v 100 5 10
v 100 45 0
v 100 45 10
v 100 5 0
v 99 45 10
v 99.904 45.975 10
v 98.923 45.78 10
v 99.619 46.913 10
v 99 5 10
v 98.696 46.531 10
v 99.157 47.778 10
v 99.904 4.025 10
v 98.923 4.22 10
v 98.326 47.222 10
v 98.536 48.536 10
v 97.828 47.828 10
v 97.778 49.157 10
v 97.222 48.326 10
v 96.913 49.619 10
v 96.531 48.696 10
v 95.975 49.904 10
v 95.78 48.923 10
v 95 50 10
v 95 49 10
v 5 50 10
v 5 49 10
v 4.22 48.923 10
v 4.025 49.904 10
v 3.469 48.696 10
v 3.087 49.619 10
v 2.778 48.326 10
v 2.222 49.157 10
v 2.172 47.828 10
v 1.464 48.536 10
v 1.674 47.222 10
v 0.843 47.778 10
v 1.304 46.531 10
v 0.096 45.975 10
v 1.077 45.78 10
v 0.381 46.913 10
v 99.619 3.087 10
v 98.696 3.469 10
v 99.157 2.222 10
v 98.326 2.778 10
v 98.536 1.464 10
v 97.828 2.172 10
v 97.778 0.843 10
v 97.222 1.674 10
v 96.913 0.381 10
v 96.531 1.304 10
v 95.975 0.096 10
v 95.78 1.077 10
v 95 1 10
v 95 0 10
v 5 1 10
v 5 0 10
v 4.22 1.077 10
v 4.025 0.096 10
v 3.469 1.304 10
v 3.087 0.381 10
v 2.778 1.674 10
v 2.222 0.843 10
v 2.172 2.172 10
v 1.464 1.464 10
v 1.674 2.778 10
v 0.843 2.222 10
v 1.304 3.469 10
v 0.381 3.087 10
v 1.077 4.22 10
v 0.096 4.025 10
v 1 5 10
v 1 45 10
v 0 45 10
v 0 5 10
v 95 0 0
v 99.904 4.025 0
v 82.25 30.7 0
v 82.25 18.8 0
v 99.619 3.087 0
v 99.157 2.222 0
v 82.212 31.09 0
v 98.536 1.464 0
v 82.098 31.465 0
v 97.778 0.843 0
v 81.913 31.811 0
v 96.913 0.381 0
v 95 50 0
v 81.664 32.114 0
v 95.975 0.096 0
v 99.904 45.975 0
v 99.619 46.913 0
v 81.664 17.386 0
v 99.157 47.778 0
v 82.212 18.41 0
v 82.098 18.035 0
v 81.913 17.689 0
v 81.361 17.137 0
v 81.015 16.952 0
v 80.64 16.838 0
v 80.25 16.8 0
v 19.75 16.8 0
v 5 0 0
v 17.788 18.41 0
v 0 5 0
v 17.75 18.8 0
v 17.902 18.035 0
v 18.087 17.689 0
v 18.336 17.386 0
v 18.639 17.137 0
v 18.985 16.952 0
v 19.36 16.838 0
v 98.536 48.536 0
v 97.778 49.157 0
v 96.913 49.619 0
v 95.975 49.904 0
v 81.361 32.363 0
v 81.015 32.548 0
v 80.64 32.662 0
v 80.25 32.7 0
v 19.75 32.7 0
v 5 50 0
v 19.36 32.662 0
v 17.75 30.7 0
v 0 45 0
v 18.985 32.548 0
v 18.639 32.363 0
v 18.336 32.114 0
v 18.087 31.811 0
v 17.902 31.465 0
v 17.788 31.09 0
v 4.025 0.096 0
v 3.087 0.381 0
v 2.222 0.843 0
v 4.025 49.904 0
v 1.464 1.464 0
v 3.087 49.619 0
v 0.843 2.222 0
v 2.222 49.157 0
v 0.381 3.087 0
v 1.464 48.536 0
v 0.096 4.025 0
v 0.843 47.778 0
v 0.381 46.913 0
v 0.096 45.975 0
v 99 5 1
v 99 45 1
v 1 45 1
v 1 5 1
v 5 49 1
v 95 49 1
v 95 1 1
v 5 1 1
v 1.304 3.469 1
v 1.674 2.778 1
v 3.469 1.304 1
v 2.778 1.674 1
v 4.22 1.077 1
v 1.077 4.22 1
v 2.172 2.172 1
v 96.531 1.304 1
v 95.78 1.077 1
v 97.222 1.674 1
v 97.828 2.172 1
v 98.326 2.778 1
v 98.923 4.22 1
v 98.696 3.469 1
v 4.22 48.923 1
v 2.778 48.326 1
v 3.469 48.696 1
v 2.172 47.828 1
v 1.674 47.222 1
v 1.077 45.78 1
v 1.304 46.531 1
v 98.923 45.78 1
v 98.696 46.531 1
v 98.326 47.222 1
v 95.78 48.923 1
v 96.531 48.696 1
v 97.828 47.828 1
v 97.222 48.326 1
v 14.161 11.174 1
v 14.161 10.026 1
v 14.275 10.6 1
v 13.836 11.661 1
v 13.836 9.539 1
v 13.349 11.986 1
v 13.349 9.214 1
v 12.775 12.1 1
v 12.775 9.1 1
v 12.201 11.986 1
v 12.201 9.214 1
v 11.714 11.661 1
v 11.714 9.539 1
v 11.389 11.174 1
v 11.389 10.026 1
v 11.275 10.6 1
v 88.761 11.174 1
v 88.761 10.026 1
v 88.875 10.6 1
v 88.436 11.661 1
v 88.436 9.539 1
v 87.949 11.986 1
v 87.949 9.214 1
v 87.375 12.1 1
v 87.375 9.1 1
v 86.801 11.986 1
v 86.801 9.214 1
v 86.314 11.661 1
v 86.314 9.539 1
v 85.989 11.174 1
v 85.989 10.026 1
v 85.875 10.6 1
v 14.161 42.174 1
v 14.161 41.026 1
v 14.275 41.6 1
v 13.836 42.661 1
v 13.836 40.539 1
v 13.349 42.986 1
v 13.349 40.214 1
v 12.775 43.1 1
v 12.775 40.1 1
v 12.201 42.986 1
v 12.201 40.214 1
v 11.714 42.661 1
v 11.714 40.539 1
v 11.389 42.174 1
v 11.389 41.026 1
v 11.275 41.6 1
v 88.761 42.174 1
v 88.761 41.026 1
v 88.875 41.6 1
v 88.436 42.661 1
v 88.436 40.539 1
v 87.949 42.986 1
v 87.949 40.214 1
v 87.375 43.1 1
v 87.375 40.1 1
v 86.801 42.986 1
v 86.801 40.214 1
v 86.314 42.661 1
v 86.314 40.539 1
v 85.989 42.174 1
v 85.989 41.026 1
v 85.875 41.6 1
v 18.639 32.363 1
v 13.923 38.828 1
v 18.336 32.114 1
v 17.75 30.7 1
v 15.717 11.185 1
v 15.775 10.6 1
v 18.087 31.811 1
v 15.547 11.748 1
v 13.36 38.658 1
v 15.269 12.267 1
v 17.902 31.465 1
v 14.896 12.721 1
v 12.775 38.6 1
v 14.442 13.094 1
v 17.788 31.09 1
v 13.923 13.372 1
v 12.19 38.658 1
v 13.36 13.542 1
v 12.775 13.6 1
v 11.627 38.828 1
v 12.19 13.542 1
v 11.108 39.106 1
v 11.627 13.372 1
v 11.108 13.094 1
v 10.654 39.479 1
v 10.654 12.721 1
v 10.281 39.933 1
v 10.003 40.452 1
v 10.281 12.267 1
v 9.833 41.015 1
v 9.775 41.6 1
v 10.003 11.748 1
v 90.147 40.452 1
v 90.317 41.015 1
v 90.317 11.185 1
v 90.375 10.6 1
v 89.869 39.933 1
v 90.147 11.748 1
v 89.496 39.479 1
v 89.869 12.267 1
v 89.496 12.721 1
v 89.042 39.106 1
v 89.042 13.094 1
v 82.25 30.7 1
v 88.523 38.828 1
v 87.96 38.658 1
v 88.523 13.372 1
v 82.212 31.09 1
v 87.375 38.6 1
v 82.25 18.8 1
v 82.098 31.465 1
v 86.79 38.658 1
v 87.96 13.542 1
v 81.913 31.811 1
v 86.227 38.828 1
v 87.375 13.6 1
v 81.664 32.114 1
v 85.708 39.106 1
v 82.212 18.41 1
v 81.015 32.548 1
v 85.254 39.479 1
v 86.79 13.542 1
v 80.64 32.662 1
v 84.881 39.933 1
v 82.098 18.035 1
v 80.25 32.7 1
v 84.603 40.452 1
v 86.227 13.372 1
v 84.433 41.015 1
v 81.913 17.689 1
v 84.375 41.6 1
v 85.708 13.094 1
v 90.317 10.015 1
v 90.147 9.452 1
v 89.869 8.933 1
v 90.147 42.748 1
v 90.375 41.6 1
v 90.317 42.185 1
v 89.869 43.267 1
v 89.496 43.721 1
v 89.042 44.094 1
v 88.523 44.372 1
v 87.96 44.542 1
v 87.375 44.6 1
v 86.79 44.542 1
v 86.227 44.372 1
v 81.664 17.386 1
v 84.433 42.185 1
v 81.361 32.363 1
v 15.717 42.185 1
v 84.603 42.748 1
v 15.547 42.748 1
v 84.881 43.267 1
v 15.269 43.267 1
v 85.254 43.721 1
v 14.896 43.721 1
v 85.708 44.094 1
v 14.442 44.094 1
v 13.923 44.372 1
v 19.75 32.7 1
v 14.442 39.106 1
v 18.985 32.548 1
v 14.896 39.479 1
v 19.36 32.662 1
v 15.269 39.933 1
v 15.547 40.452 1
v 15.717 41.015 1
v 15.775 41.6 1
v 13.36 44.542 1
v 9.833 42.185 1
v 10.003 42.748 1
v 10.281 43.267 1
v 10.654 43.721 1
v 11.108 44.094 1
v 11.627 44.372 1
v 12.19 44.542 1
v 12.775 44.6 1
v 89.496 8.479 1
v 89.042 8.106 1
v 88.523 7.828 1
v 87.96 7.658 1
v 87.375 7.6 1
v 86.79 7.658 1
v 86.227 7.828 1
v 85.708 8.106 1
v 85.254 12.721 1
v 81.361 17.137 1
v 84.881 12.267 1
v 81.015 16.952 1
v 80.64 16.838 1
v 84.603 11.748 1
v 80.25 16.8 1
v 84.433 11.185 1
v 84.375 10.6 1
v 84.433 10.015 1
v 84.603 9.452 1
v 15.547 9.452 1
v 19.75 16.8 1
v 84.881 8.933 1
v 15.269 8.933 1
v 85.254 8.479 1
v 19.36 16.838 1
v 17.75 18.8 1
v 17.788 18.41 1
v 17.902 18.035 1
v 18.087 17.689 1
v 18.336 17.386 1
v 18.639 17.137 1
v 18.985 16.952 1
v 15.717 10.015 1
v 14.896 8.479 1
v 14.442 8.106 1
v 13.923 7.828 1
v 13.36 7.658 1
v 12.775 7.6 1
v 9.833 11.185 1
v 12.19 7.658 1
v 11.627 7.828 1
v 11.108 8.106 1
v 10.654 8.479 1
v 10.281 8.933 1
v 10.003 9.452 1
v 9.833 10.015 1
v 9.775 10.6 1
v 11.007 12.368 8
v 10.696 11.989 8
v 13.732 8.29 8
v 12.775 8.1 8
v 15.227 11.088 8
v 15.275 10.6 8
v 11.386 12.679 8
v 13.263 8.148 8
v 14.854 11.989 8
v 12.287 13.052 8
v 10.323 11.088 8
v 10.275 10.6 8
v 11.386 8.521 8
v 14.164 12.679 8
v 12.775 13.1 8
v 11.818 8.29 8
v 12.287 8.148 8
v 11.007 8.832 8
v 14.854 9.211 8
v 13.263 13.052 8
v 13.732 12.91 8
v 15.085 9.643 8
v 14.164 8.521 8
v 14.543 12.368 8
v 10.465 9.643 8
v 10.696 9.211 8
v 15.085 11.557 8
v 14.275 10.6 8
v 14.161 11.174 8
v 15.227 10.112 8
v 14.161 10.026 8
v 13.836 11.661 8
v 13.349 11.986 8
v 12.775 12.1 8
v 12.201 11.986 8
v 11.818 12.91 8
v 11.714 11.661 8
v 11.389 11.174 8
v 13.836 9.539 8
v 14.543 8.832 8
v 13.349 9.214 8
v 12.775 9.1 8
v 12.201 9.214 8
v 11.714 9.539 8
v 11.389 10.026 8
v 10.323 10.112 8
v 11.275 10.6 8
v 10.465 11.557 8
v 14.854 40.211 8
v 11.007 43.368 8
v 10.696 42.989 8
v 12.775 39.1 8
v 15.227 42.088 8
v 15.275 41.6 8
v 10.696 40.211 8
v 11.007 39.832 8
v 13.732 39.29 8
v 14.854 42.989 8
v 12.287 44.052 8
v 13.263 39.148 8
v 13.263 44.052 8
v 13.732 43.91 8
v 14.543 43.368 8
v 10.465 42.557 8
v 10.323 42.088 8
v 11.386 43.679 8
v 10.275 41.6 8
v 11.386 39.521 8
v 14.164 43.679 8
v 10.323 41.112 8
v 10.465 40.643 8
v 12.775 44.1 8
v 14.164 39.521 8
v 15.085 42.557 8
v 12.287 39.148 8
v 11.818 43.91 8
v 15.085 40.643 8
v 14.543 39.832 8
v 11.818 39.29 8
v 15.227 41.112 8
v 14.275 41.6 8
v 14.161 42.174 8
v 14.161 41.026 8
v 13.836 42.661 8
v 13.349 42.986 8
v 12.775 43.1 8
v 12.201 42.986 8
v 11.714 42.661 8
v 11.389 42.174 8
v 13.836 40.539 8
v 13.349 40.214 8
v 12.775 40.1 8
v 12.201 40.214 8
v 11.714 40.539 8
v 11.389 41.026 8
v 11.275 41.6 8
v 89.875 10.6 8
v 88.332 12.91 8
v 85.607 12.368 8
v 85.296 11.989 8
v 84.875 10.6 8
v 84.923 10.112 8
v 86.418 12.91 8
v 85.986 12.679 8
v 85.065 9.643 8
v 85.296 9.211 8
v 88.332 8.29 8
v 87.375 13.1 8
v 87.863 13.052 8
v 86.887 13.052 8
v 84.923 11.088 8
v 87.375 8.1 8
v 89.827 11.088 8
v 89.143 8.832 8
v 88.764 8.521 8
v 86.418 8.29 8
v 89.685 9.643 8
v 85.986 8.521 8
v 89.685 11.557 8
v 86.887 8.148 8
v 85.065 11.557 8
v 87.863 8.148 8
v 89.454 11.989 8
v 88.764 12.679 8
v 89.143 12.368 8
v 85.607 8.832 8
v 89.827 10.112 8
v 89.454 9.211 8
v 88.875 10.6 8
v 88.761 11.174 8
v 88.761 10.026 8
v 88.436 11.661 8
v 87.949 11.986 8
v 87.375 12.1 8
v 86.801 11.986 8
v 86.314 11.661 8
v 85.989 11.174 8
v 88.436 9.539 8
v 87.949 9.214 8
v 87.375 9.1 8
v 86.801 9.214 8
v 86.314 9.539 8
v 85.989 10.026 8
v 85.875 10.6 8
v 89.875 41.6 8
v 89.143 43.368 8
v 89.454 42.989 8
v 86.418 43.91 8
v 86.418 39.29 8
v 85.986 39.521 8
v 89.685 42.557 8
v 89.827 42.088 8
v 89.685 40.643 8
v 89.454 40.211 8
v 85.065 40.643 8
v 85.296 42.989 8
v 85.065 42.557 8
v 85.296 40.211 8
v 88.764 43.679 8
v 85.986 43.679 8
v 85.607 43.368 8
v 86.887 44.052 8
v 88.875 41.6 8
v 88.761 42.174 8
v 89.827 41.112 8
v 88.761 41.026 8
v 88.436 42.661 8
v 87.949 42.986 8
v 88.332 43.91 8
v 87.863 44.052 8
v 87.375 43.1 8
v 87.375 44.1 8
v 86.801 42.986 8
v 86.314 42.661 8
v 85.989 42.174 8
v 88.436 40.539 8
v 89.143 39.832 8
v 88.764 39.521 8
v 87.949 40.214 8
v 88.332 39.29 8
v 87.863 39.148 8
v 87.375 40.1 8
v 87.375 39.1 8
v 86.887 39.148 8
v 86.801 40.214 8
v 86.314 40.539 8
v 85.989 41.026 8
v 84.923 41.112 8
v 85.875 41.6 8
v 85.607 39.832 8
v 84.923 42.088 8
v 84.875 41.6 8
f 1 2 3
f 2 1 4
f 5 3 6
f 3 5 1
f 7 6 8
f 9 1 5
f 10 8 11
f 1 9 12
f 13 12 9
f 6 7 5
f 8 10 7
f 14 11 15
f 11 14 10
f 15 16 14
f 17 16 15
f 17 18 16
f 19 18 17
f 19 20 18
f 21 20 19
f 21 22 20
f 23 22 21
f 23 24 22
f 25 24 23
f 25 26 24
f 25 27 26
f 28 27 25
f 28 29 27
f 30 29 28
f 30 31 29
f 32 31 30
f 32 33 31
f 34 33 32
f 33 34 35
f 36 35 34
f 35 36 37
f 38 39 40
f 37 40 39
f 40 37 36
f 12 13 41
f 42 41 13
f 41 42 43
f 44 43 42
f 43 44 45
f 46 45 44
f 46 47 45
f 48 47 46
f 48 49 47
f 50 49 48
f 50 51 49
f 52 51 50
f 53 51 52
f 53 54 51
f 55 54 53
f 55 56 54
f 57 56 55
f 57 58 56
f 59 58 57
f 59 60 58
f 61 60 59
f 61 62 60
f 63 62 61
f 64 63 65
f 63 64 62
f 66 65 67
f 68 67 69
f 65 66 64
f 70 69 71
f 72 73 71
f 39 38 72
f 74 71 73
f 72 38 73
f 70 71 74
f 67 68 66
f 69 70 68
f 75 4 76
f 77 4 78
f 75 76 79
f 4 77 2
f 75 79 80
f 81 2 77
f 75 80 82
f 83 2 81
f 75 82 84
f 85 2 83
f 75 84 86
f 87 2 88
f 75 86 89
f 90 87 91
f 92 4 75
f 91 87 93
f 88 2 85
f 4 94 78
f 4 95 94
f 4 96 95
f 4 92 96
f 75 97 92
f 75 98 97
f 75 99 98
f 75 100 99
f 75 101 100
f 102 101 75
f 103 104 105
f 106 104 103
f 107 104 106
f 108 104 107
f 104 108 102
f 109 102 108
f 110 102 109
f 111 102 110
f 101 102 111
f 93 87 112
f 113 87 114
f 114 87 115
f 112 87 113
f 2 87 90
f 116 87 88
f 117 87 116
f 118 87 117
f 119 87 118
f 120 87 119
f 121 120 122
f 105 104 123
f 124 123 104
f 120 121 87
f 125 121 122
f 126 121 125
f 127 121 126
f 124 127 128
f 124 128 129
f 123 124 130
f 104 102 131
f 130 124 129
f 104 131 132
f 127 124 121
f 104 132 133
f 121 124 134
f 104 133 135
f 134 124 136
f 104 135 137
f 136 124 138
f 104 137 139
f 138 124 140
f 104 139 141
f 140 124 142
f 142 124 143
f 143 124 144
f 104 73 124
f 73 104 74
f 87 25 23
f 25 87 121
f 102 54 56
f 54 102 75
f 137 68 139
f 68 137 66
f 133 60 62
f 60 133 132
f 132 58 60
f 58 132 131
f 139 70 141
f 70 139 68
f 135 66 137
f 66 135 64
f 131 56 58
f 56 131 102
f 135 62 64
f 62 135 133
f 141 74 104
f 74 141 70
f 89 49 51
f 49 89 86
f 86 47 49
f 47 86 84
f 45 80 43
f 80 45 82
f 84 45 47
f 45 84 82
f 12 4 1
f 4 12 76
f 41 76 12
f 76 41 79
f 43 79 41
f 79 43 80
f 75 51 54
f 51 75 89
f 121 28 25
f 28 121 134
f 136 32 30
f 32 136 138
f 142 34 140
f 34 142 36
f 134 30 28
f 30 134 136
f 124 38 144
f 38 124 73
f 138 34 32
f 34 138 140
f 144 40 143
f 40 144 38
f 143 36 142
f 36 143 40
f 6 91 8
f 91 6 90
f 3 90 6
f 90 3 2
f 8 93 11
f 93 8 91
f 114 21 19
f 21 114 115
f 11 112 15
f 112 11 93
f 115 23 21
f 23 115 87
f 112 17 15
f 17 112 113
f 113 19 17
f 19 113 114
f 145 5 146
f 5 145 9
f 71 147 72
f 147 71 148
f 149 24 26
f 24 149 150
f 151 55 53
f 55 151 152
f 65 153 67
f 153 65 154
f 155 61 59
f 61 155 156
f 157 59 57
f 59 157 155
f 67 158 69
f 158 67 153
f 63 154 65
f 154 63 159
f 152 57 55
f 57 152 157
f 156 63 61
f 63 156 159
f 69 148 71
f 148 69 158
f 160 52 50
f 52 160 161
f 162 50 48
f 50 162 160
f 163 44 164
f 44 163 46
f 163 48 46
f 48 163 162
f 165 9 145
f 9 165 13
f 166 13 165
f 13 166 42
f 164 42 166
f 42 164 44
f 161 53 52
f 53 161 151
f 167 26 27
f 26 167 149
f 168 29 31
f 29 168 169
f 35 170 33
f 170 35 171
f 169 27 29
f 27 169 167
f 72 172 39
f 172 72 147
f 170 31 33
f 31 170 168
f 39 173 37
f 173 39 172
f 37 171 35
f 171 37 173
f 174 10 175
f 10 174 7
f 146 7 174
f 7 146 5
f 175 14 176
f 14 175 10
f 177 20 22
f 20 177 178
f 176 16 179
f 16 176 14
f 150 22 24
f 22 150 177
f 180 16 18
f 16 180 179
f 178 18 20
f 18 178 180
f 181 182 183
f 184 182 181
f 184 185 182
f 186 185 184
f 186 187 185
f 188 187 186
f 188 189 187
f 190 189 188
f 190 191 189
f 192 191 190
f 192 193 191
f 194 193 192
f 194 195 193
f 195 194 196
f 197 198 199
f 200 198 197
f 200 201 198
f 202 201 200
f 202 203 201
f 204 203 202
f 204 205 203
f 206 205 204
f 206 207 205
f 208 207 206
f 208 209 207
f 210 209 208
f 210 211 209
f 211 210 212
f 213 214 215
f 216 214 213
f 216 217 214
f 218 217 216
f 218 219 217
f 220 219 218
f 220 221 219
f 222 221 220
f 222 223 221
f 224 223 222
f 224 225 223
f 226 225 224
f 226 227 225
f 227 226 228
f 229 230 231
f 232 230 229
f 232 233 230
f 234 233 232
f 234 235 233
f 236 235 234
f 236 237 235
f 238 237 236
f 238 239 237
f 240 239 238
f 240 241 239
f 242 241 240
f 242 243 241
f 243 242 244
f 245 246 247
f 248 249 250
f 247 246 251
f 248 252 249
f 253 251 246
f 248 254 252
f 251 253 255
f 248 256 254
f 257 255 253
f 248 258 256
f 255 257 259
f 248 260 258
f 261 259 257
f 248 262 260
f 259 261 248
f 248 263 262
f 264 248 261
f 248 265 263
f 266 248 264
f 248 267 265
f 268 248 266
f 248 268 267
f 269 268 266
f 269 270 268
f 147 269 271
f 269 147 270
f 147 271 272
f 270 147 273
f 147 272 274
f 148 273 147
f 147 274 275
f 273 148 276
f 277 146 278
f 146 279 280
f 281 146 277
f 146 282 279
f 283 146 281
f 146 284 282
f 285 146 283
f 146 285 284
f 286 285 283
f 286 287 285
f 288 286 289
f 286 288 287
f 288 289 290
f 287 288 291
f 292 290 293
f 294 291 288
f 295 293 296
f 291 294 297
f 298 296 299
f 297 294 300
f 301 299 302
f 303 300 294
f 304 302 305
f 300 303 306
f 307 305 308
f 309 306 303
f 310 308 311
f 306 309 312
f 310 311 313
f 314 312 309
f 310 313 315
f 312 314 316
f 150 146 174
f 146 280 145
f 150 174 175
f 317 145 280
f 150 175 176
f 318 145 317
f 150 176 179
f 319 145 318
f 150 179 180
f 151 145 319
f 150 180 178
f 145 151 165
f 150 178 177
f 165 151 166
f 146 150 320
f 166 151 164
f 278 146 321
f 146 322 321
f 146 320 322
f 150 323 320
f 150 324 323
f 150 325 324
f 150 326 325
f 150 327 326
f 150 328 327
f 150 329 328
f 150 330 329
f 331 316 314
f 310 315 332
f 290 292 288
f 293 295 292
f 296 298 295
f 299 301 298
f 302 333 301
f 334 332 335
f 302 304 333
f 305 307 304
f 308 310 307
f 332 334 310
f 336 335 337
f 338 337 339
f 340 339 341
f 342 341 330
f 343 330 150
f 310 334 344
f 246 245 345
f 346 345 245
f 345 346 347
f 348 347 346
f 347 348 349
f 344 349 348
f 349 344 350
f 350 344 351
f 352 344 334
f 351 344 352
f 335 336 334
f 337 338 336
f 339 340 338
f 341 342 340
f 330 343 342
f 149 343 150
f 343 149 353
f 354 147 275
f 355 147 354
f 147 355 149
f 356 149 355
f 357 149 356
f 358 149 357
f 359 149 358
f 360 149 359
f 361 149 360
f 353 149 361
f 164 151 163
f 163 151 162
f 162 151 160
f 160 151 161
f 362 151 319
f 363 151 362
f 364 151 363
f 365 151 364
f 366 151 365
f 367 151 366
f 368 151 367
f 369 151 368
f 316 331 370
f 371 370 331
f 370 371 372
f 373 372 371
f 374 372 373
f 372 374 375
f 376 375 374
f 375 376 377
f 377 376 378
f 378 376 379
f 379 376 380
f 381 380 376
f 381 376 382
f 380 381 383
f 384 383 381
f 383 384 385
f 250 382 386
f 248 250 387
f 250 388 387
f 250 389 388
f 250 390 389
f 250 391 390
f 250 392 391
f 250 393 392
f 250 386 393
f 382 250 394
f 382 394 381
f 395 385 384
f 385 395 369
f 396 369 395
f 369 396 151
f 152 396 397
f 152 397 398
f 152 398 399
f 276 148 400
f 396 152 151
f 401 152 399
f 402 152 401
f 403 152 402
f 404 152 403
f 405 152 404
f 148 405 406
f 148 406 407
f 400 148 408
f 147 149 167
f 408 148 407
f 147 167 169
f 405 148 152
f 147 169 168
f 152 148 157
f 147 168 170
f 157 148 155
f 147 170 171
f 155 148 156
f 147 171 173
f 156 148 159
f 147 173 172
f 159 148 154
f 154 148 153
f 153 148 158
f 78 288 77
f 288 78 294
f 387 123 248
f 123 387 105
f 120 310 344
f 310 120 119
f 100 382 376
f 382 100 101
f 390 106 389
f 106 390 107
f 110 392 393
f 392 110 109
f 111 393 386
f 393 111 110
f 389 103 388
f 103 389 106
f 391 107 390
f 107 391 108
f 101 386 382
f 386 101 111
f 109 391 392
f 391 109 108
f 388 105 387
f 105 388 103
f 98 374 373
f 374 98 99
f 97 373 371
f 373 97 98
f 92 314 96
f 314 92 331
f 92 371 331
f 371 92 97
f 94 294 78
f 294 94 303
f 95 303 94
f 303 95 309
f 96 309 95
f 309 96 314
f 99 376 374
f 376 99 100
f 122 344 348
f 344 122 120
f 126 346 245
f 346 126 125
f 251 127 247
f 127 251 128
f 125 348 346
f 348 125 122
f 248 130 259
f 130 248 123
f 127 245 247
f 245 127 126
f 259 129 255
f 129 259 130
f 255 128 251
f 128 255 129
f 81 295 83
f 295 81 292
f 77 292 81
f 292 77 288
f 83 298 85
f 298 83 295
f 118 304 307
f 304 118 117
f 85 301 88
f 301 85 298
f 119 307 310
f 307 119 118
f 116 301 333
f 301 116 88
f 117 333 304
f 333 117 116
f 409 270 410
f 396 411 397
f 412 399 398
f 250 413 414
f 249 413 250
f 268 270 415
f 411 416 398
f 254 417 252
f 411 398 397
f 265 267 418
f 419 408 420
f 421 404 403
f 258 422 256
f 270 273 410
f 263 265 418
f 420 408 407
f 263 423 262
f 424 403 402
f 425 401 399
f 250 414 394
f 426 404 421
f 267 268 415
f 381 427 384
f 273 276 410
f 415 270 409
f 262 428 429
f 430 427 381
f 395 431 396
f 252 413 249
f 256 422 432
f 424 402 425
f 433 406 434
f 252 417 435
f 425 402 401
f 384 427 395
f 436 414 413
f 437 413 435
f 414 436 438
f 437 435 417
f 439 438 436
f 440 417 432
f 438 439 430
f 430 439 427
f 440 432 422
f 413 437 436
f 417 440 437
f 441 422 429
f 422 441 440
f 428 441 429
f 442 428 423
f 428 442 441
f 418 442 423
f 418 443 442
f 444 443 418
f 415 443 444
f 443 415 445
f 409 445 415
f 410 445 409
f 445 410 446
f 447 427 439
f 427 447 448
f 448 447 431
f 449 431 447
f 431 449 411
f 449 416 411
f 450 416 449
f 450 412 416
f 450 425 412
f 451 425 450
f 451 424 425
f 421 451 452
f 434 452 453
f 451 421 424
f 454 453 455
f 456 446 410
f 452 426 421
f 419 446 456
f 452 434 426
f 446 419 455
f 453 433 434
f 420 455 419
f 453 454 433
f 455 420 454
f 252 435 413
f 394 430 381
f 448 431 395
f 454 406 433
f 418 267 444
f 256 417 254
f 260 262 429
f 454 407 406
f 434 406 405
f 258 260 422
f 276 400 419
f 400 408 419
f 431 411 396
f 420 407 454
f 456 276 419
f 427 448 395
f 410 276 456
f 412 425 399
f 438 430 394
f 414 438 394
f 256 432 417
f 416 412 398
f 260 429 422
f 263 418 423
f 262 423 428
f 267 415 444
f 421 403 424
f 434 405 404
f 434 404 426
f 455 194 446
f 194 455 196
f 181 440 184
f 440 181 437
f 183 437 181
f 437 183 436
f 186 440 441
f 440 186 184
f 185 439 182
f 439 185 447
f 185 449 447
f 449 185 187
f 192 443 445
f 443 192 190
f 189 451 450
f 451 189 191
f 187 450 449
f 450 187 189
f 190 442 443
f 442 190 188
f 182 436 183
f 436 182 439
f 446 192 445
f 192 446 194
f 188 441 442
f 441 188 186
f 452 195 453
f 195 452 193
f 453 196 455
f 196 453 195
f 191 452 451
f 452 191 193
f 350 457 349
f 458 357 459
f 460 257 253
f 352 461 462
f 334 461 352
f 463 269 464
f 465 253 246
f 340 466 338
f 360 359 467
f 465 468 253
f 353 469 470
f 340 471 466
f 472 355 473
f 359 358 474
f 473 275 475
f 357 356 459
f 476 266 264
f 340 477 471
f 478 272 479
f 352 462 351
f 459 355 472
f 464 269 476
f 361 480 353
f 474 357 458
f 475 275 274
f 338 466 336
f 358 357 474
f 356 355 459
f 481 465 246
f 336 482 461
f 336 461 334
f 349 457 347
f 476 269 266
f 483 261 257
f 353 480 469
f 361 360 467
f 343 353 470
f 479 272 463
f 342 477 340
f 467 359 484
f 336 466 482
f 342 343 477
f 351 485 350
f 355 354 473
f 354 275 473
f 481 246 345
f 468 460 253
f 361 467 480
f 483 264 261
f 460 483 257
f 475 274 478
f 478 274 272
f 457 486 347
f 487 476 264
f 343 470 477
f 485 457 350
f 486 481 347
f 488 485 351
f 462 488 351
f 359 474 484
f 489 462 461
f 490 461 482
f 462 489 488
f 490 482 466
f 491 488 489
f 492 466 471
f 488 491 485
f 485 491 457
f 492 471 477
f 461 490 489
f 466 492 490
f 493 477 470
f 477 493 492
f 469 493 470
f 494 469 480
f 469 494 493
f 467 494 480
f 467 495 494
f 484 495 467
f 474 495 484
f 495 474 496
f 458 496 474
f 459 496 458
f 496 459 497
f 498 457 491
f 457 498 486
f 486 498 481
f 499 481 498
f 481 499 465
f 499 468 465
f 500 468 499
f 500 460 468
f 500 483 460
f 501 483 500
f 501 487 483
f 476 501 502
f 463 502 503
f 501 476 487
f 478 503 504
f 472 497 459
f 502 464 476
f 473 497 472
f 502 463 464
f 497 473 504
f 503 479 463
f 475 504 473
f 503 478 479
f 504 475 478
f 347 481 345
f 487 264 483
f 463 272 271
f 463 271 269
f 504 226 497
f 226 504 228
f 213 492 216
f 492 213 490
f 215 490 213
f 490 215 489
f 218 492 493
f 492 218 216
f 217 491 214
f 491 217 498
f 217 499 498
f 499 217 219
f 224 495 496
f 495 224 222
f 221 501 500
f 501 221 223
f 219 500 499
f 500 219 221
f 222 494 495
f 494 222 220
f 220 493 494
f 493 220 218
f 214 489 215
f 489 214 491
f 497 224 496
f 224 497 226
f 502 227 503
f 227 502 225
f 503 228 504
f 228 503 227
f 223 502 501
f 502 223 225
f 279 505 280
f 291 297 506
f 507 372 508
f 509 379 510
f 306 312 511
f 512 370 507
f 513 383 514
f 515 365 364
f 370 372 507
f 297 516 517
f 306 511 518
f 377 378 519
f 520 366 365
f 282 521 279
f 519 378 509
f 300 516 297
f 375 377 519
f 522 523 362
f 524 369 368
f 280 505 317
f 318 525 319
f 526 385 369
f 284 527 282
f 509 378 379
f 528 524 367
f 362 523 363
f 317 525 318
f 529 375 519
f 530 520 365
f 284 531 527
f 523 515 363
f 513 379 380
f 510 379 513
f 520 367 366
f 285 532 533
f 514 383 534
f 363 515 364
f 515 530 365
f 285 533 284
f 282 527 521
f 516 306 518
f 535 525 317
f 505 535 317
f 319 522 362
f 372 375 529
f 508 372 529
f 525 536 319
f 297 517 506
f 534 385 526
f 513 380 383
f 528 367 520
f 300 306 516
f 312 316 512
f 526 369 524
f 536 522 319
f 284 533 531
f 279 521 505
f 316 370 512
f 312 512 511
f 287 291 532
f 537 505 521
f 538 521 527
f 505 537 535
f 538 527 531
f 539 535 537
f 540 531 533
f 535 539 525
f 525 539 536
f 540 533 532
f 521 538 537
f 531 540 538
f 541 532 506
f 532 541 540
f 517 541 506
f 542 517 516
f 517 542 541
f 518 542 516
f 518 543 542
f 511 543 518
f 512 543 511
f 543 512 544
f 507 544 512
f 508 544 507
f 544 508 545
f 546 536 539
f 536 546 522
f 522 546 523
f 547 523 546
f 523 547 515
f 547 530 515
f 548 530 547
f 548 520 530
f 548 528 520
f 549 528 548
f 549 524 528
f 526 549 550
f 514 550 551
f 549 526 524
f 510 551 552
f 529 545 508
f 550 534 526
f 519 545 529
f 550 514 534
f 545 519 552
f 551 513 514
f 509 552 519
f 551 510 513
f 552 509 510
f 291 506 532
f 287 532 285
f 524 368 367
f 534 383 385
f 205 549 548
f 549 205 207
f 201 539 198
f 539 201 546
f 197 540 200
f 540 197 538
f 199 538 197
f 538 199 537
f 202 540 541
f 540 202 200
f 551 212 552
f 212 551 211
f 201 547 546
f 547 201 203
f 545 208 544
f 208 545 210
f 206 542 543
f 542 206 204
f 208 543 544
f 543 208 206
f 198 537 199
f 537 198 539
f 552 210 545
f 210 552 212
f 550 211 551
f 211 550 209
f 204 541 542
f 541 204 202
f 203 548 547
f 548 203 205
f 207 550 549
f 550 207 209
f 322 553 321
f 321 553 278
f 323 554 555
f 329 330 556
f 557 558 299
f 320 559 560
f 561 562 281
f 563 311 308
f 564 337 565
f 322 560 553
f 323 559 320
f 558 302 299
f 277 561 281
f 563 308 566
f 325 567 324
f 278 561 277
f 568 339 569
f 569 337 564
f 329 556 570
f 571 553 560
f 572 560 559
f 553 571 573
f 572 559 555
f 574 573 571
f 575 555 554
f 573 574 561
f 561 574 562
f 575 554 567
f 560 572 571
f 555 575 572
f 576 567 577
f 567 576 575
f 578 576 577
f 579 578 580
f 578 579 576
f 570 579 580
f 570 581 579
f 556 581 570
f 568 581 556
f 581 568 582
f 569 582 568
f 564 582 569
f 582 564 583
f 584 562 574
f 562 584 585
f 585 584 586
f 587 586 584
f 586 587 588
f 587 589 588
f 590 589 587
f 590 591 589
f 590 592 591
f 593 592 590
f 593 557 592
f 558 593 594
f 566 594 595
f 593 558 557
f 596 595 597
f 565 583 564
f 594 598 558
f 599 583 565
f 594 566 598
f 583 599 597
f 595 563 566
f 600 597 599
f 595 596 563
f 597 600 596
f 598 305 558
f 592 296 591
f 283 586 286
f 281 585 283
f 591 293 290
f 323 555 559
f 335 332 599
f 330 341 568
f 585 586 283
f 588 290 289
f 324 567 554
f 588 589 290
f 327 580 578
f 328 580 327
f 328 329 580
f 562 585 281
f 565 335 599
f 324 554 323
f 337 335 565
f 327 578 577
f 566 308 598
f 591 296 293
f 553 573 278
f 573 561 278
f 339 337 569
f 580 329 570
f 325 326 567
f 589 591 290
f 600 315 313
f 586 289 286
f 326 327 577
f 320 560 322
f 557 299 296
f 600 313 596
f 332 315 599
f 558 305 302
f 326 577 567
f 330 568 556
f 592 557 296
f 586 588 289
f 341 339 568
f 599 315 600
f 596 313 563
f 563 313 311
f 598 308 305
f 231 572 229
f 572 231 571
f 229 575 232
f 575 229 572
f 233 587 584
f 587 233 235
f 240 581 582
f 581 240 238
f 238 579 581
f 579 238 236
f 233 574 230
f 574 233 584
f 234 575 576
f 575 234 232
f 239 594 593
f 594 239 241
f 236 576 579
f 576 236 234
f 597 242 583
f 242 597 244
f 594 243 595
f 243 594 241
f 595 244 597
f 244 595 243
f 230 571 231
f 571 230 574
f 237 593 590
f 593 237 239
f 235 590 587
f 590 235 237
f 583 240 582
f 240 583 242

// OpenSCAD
//base plate
size_x=100;
size_y=50;
size_z=1;
corner_radius=5;
corner_faces=32;

//cutout
cutout_corner_radius=2;
cutout_corner_faces=32;
offset_x=10;
offset_y=8;

//rim
rim_height=10;

module plate (sizeX, sizeY, sizeZ, cornerRadius, cornerFaces)
{
	union()
	{
		difference()
		{
			cube([sizeX,sizeY,sizeZ]);		
			cube([cornerRadius,cornerRadius,	sizeZ+1]);
			translate([sizeX-cornerRadius,0,0]) cube([cornerRadius,cornerRadius,sizeZ+1]);
			translate([0,sizeY-cornerRadius,0]) cube([cornerRadius,cornerRadius,sizeZ+1]);
			translate([sizeX-cornerRadius,sizeY-cornerRadius,0]) cube([cornerRadius,cornerRadius,sizeZ+1]);
		}
		translate([cornerRadius,cornerRadius,0]) cylinder(r=cornerRadius,h=sizeZ, $fn=cornerFaces);
		translate([sizeX-cornerRadius,cornerRadius,0]) cylinder(r=cornerRadius,h=sizeZ, $fn=cornerFaces);
		translate([cornerRadius,sizeY-cornerRadius,0]) cylinder(r=cornerRadius,h=sizeZ, $fn=cornerFaces);
		translate([sizeX-cornerRadius,sizeY-cornerRadius,0]) cylinder(r=cornerRadius,h=sizeZ, $fn=cornerFaces);
	}
}

module posts()
{

	union()
	{
		difference()
		{
			translate([0+2.775,0+2.6,size_z]) cylinder(r1=6/2, r2=5/2,h=7, $fn=32);	
			translate([0+2.775,0+2.6,size_z]) cylinder(r=3/2,h=7.5, $fn=16);
		}
		difference()
		{
			translate([0+2.775,31+2.6,size_z]) cylinder(r1=6/2, r2=5/2,h=7, $fn=32);
			translate([0+2.775,31+2.6,size_z]) cylinder(r=3/2,h=7.5, $fn=16);
		}

		difference()
		{
			translate([74.60+2.775,0+2.6,size_z]) cylinder(r1=6/2, r2=5/2,h=7, $fn=32);
			translate([74.60+2.775,0+2.6,size_z]) cylinder(r=3/2,h=7.5, $fn=16);
		}	

		difference()
		{
			translate([74.60+2.775,31+2.6,size_z]) cylinder(r1=6/2, r2=5/2,h=7, $fn=32);
			translate([74.60+2.775,31+2.6,size_z]) cylinder(r=3/2,h=7.5, $fn=16);
		}
	}
}


difference()
{
plate (size_x, size_y,rim_height, corner_radius, corner_faces);
translate([size_z,size_z,0])
plate (size_x-(2*size_z), size_y-(2*size_z),rim_height, corner_radius-size_z, corner_faces);
}

union()
{
difference()
{
//base plate
plate (size_x, size_y, size_z, corner_radius, corner_faces);

//display cutout
translate([7.75+offset_x,8.8+offset_y,0])
plate(64.5,15.9,10,cutout_corner_radius,cutout_corner_faces);

}
translate([offset_x,offset_y,0])
posts();
}


